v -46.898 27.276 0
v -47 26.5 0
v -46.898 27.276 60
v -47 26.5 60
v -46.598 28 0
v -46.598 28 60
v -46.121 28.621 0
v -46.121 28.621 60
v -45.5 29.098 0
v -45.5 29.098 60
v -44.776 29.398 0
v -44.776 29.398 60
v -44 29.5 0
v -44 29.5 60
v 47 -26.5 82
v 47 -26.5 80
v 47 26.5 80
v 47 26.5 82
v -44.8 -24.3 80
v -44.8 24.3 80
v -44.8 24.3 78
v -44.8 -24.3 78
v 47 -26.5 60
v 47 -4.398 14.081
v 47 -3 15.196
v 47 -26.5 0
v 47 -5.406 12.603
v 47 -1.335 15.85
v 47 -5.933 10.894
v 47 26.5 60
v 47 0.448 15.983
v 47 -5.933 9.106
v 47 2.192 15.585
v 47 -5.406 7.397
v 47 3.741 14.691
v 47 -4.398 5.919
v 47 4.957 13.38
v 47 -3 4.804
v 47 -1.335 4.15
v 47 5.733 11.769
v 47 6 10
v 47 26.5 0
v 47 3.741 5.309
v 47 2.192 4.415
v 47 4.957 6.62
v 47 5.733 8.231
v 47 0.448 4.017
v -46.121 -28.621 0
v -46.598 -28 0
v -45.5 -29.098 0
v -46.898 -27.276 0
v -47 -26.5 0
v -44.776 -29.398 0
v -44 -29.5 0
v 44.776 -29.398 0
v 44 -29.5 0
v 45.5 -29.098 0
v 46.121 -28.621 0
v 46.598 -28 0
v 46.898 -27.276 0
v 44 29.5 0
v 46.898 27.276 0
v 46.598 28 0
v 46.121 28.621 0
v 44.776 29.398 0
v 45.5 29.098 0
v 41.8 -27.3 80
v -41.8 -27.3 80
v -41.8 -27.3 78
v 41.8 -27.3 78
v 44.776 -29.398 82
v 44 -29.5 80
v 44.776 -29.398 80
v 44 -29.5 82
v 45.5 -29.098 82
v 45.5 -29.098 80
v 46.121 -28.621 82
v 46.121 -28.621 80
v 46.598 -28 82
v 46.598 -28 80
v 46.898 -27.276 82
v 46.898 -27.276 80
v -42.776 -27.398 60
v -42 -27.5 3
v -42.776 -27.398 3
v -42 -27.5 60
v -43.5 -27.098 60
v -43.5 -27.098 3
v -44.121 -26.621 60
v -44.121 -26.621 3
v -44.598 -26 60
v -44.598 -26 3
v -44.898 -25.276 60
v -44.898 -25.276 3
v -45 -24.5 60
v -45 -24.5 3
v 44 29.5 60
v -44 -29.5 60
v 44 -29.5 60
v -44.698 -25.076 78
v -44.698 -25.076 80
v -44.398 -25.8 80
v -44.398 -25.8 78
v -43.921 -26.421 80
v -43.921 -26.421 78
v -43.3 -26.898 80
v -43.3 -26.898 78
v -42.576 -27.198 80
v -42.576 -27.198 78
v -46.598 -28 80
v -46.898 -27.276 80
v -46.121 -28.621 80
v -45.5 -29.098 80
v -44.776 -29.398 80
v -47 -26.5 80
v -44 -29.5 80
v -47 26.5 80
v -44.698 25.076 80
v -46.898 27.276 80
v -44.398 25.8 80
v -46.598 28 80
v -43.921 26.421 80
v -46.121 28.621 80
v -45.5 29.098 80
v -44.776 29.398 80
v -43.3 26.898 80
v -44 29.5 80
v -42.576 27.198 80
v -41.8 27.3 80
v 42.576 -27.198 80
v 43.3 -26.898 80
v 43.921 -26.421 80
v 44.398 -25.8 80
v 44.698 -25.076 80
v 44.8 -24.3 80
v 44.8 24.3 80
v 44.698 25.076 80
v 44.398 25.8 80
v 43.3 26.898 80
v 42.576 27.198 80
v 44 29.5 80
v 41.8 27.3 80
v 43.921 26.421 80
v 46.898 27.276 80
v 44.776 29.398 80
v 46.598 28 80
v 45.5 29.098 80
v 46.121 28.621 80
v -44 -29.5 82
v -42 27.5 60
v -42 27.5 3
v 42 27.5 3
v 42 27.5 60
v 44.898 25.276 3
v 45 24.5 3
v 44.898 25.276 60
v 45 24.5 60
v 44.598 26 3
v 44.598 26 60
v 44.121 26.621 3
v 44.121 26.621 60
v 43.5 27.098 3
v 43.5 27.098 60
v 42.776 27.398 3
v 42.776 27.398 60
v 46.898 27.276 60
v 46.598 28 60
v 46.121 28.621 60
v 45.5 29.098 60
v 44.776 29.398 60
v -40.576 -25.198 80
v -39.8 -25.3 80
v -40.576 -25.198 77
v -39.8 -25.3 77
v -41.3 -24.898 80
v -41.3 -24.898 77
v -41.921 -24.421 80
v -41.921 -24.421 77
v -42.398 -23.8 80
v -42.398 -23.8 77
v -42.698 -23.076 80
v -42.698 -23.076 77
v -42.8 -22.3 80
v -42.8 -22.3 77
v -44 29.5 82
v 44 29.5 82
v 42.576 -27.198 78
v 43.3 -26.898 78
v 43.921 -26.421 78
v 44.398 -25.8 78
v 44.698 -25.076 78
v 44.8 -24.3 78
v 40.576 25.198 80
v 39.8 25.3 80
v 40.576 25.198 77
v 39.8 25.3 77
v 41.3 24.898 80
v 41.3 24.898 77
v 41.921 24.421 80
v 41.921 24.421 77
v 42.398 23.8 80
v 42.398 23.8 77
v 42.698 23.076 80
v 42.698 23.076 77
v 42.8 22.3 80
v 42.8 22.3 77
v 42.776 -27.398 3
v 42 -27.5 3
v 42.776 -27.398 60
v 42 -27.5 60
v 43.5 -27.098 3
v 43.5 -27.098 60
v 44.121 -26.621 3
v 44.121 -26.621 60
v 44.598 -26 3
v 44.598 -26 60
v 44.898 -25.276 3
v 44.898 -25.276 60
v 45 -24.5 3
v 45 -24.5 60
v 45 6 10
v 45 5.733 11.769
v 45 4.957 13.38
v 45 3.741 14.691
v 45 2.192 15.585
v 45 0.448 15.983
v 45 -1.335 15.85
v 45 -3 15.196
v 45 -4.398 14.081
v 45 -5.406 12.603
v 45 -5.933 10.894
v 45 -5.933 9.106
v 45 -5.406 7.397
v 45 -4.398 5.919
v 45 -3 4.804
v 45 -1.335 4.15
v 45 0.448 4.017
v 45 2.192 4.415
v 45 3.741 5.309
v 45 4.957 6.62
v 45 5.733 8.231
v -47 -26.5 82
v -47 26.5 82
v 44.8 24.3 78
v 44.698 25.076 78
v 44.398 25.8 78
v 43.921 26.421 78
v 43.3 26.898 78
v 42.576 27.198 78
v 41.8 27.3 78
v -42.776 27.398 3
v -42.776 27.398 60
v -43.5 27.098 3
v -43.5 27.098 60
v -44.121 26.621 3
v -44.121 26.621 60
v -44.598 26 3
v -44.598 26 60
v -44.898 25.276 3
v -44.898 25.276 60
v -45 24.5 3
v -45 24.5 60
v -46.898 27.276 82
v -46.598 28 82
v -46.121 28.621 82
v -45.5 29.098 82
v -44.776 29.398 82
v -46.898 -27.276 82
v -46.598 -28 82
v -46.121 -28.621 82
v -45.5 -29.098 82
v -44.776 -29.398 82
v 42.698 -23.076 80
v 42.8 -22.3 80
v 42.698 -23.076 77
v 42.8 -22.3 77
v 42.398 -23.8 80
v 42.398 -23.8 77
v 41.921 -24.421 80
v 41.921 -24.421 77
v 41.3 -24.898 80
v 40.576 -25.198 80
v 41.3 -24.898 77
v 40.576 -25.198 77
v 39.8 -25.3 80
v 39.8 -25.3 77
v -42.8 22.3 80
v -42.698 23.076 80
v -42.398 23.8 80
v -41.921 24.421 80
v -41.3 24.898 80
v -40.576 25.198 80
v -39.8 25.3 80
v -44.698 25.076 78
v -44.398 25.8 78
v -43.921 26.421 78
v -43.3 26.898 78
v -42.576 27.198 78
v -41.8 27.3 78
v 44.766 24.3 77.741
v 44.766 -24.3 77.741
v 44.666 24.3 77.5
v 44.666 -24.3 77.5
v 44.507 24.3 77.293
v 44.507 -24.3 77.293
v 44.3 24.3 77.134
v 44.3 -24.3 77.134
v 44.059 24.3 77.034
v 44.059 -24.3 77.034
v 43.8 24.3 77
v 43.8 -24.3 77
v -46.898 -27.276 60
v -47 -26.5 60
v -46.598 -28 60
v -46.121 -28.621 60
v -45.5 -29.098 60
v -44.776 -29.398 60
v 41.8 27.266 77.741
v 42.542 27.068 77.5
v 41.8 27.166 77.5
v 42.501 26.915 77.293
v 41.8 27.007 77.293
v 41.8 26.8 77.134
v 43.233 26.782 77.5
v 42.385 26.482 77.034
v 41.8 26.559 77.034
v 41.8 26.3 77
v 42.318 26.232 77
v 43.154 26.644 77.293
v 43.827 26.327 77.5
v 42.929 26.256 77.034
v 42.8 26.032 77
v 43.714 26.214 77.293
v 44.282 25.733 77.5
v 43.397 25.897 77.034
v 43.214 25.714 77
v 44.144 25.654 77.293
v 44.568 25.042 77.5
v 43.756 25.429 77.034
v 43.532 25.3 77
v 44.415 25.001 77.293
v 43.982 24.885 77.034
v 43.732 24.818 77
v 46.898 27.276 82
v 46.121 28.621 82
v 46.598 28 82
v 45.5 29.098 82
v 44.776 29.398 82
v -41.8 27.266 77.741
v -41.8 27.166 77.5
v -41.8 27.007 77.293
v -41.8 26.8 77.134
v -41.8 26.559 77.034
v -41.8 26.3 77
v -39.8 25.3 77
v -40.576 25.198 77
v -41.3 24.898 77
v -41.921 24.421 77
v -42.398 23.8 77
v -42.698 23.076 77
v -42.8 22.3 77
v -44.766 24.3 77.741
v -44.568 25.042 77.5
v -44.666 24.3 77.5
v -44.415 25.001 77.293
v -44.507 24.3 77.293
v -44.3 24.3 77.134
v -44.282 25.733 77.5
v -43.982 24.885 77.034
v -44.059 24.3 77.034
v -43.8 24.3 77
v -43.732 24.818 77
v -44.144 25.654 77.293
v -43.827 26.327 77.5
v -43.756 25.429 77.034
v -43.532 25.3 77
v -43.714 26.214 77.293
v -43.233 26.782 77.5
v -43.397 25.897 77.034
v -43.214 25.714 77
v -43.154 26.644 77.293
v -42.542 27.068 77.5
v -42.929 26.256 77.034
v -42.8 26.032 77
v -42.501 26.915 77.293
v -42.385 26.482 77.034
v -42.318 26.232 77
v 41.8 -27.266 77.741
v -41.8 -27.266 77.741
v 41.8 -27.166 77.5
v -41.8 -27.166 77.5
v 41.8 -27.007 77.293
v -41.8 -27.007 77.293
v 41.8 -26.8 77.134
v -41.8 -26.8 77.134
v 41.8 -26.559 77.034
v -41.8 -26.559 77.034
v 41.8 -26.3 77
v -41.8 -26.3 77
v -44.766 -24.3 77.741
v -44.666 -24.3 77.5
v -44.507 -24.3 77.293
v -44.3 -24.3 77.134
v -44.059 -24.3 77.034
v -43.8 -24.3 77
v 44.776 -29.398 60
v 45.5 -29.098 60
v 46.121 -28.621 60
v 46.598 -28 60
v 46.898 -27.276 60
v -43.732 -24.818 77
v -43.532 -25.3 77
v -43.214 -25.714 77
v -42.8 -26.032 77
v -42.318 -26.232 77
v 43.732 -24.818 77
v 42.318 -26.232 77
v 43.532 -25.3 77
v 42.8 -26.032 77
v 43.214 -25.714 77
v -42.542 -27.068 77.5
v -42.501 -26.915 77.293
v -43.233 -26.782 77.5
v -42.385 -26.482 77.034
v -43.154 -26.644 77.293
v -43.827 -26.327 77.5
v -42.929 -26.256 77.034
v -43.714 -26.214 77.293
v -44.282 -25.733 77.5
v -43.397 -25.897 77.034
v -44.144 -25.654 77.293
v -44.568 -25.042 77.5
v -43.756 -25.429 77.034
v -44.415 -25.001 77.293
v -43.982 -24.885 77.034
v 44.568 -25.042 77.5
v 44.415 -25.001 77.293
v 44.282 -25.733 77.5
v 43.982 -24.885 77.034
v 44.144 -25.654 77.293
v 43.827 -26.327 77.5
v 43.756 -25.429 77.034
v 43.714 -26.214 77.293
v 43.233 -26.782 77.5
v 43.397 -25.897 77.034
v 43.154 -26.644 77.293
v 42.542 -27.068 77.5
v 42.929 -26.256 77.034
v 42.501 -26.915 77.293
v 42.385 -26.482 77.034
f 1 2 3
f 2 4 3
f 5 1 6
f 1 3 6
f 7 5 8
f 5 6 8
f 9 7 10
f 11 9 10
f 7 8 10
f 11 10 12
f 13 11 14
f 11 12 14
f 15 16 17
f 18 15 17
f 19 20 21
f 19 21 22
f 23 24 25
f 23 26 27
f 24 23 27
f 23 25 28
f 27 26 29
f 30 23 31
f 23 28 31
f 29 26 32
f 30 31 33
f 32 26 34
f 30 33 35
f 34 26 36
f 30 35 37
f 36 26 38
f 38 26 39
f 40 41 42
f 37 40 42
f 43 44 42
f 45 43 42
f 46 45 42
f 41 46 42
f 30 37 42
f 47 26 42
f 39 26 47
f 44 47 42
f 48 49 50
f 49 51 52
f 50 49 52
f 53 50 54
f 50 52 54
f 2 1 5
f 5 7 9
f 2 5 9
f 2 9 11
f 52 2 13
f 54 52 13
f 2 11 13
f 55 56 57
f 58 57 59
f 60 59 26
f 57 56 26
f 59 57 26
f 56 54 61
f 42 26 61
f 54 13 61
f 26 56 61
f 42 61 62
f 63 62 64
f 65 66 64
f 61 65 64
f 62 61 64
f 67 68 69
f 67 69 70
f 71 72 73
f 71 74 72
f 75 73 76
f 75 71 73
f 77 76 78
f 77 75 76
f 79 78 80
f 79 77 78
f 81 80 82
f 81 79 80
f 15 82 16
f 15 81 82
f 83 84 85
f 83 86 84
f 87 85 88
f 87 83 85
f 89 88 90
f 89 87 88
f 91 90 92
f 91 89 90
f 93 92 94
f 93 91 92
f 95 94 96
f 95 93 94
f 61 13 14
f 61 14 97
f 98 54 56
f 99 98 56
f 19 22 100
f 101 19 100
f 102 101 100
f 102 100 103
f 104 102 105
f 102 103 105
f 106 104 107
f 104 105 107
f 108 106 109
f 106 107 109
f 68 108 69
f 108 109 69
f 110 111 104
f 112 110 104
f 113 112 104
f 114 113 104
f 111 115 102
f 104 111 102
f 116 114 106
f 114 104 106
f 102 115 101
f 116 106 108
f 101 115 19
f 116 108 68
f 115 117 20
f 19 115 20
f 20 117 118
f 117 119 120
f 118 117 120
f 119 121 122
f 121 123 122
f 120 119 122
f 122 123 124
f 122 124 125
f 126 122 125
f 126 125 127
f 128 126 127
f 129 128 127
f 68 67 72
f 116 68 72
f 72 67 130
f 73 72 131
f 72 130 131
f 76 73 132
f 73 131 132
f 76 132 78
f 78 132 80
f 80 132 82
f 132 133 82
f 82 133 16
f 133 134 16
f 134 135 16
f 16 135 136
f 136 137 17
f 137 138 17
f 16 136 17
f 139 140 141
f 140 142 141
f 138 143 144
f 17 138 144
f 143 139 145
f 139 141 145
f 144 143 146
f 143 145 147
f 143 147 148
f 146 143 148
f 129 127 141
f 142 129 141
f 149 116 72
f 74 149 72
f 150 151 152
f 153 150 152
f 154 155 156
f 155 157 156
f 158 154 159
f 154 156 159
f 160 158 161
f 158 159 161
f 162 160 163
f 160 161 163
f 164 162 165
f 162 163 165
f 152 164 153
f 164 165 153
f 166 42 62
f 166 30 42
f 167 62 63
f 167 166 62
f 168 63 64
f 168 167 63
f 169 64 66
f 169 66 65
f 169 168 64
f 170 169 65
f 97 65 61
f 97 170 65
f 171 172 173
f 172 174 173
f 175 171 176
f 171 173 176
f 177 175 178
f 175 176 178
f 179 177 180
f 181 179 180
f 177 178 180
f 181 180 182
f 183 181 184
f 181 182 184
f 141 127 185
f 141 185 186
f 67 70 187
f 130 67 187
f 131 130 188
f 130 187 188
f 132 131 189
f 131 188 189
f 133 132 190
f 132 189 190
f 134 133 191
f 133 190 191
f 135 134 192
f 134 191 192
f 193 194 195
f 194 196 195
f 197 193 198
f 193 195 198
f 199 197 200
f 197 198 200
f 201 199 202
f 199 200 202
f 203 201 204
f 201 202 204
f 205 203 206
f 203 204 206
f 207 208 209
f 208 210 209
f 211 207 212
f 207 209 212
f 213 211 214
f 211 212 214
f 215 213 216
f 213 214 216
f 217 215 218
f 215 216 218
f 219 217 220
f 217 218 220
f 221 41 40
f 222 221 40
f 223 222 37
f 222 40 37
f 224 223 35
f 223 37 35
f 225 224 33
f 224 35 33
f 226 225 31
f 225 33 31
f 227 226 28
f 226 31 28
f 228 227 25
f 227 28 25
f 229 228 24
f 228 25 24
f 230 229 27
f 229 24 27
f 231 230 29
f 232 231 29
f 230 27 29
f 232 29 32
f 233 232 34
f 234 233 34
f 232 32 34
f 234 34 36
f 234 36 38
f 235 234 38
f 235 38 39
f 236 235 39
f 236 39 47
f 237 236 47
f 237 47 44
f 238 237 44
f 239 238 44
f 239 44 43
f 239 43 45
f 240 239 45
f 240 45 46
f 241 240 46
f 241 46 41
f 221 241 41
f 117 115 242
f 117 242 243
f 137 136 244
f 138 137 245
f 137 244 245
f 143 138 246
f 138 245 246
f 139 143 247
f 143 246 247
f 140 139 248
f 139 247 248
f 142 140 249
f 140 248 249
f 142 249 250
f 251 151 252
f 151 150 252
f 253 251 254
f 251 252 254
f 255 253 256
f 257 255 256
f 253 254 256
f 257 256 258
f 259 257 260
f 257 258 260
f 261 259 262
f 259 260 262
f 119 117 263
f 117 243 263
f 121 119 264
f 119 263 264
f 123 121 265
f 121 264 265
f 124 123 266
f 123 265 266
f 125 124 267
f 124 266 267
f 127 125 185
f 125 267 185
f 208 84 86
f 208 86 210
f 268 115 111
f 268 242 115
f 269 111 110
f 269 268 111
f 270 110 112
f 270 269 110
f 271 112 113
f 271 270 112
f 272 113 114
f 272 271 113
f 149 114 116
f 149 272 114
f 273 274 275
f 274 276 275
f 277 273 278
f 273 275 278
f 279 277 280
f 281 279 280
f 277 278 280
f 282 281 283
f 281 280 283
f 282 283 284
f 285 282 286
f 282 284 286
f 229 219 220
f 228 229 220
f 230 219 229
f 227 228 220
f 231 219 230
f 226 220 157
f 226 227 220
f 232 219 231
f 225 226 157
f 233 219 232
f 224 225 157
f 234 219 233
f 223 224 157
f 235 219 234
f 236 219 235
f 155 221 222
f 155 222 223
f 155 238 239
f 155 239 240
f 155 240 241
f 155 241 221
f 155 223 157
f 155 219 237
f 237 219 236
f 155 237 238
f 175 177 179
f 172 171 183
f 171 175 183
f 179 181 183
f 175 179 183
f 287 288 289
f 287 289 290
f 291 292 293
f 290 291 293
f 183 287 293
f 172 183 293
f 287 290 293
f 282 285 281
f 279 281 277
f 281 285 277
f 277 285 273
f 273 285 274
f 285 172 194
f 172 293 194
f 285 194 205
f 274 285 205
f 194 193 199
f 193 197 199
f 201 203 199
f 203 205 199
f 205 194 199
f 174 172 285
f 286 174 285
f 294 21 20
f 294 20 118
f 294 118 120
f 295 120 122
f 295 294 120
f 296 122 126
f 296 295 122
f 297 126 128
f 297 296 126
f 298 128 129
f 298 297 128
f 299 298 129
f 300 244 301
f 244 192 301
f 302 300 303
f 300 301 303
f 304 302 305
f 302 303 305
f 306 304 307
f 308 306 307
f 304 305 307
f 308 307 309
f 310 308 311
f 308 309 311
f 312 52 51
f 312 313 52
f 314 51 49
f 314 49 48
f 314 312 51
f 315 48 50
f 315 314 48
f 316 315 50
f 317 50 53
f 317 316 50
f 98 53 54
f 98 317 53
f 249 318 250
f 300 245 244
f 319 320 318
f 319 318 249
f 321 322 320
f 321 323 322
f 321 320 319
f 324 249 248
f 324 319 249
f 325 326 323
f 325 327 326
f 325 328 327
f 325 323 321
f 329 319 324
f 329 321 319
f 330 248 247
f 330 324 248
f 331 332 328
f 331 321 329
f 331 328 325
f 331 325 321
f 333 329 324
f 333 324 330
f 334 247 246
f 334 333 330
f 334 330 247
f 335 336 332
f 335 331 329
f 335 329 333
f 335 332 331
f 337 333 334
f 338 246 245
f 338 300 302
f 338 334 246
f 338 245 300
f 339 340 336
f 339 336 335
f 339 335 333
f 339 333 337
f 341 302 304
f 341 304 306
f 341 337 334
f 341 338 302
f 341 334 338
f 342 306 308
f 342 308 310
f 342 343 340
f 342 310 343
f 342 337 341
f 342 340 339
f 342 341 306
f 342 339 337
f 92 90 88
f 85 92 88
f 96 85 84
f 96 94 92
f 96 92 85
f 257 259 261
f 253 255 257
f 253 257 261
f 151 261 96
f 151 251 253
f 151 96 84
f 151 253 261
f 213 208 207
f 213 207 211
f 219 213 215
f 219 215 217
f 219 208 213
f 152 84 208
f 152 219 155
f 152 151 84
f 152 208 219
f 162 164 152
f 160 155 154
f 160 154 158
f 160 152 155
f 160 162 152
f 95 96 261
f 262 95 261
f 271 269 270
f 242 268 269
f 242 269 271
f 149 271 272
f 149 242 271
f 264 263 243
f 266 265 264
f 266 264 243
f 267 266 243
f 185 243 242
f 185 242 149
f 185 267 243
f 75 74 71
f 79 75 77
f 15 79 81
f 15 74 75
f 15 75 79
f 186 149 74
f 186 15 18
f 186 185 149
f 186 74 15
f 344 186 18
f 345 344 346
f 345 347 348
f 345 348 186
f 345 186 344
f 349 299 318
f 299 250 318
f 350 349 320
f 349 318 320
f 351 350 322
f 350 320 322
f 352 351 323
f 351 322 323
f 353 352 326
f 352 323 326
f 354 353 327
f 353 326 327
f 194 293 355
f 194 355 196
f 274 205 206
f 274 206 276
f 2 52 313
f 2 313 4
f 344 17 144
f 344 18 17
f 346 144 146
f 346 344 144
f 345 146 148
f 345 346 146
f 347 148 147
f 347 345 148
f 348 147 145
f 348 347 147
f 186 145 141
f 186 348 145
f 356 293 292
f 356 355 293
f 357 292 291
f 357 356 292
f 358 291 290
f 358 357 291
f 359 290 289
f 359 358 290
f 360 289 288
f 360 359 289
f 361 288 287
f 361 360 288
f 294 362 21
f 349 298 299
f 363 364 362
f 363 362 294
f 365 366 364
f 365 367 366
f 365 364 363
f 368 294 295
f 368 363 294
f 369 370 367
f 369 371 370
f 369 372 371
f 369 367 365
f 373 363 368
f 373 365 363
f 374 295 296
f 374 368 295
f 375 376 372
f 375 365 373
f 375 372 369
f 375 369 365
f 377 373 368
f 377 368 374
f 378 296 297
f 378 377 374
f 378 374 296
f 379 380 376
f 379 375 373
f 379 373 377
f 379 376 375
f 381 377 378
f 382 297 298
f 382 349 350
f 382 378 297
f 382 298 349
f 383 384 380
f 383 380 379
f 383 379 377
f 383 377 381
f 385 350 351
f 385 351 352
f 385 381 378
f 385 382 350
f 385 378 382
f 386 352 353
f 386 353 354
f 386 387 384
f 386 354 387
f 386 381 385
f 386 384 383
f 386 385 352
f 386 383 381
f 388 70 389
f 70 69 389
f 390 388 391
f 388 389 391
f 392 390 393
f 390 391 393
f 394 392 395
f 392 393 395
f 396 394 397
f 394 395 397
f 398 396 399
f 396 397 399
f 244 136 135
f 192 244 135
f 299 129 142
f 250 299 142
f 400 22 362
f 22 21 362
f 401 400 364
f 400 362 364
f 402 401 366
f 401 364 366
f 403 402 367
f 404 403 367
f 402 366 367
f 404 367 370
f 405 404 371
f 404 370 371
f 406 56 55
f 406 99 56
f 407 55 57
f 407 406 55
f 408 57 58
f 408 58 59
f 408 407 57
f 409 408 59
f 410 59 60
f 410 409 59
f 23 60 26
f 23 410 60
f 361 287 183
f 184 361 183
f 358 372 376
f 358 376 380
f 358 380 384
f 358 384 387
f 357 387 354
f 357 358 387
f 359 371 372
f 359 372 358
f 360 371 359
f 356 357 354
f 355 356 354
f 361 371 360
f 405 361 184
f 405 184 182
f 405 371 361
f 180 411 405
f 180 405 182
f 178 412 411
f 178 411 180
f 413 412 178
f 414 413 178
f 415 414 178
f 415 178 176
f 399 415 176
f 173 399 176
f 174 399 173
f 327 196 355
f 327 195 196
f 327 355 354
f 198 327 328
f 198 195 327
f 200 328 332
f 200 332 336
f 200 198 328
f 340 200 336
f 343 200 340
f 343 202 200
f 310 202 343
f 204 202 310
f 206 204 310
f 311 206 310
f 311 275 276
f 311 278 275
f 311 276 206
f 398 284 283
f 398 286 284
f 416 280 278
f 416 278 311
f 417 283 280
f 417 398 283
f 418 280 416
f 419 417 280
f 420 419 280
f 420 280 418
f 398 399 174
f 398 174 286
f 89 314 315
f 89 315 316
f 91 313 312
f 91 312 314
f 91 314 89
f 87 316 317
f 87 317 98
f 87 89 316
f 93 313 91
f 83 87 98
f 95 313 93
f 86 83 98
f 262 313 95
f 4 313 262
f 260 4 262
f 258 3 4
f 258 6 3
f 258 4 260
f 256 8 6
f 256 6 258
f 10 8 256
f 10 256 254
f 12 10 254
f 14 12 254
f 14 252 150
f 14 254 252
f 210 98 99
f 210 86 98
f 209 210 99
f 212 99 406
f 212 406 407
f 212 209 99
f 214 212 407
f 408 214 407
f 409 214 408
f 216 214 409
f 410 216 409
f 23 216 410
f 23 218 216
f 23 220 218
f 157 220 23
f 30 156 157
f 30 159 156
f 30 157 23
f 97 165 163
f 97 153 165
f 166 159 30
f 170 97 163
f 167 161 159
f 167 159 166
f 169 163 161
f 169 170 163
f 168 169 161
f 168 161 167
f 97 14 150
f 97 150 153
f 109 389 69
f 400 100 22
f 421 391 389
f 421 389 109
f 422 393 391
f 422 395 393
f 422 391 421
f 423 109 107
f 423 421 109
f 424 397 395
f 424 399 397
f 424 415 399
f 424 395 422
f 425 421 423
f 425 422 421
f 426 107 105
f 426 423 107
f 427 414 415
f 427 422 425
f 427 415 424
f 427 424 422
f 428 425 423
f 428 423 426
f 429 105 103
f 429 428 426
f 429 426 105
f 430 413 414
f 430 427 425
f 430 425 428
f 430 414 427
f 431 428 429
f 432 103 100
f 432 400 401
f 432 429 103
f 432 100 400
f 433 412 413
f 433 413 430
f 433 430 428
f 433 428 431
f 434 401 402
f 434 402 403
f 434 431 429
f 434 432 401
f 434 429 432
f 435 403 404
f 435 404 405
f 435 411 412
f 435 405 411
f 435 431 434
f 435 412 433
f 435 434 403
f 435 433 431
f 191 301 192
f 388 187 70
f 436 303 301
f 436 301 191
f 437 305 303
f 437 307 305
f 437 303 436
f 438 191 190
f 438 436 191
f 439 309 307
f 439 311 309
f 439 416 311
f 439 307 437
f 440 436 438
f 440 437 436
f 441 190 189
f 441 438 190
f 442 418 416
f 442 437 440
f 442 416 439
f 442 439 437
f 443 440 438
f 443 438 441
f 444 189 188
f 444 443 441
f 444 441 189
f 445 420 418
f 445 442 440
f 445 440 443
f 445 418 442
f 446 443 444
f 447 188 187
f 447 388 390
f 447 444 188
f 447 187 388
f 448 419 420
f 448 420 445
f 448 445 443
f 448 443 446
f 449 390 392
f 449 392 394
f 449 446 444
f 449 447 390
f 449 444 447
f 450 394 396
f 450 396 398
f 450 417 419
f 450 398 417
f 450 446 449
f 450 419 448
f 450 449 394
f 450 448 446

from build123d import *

# Parameters (mm, degrees)
F0_W      = 94
F0_H      = 59
F0_W_2    = 90
F0_H_2    = 55
F1_DEPTH  = 60
F2_DEPTH  = 3
F3_R      = 6
F4_DEPTH  = 5
F5_R      = 3
F7_W      = 94
F7_H      = 59
F7_W_2    = 90
F7_H_2    = 55
F8_DEPTH  = 2
F9_R      = 3
F10_W     = 89.6
F10_H     = 54.6
F10_W_2   = 85.6
F10_H_2   = 50.6
F11_DEPTH = 3
F12_R     = 3
F13_R     = 1


with BuildPart() as f1:
    # F0 (on Top) → F1 (new body)
    with BuildSketch(Plane.XY):
        Rectangle(F0_W, F0_H)
        Rectangle(F0_W_2, F0_H_2, mode=Mode.SUBTRACT)
    extrude(amount=F1_DEPTH)

    # F0 (on Top) → F2 (join)
    with BuildSketch(Plane.XY):
        Rectangle(F0_W_2, F0_H_2)
    extrude(amount=F2_DEPTH)

    # F3 (on face) → F4 (cut)
    with BuildSketch(Plane.YZ.offset(47)):
        with Locations((0, 10)):
            Circle(F3_R)
    extrude(amount=-F4_DEPTH, mode=Mode.SUBTRACT)

    # F5
    f5_edges = [f1.edges().sort_by_distance(p)[0] for p in [
        (47, -29.5, 30),
        (47, 29.5, 30),
        (-47, 29.5, 30),
        (-47, -29.5, 30),
        (-45, 27.5, 31.5),
        (-45, -27.5, 31.5),
        (45, 27.5, 31.5),
        (45, -27.5, 31.5),
    ]]
    fillet(f5_edges, radius=F5_R)


with BuildPart() as f8:
    # F7 (on offset) → F8 (new body)
    with BuildSketch(Plane.XY.offset(80)):
        Rectangle(F7_W, F7_H)
        Rectangle(F7_W_2, F7_H_2, mode=Mode.SUBTRACT)
        Rectangle(F7_W_2, F7_H_2)
    extrude(amount=F8_DEPTH)

    # F9
    f9_edges = [f8.edges().sort_by_distance(p)[0] for p in [
        (-47, 29.5, 81),
        (-47, -29.5, 81),
        (47, -29.5, 81),
        (47, 29.5, 81),
    ]]
    fillet(f9_edges, radius=F9_R)

    # F10 (on face) → F11 (join)
    with BuildSketch(Plane(origin=(0, 0, 80), x_dir=(1, 0, 0), z_dir=(0, 0, -1))):
        Rectangle(F10_W, F10_H)
        Rectangle(F10_W_2, F10_H_2, mode=Mode.SUBTRACT)
    extrude(amount=F11_DEPTH)

    # F12
    f12_edges = [f8.edges().sort_by_distance(p)[0] for p in [
        (44.8, -27.3, 78.5),
        (-44.8, -27.3, 78.5),
        (42.8, -25.3, 78.5),
        (44.8, 27.3, 78.5),
        (-42.8, -25.3, 78.5),
        (-44.8, 27.3, 78.5),
        (42.8, 25.3, 78.5),
        (-42.8, 25.3, 78.5),
    ]]
    fillet(f12_edges, radius=F12_R)

    # F13
    f13_edges = [f8.edges().sort_by_distance(p)[0] for p in [
        (0, 27.3, 77),
        (-43.92132, 26.42132, 77),
        (-44.8, 0, 77),
        (-43.92132, -26.42132, 77),
        (0, -27.3, 77),
        (44.8, 0, 77),
        (43.92132, -26.42132, 77),
        (43.92132, 26.42132, 77),
    ]]
    fillet(f13_edges, radius=F13_R)


solid = Compound([f1.part, f8.part])
